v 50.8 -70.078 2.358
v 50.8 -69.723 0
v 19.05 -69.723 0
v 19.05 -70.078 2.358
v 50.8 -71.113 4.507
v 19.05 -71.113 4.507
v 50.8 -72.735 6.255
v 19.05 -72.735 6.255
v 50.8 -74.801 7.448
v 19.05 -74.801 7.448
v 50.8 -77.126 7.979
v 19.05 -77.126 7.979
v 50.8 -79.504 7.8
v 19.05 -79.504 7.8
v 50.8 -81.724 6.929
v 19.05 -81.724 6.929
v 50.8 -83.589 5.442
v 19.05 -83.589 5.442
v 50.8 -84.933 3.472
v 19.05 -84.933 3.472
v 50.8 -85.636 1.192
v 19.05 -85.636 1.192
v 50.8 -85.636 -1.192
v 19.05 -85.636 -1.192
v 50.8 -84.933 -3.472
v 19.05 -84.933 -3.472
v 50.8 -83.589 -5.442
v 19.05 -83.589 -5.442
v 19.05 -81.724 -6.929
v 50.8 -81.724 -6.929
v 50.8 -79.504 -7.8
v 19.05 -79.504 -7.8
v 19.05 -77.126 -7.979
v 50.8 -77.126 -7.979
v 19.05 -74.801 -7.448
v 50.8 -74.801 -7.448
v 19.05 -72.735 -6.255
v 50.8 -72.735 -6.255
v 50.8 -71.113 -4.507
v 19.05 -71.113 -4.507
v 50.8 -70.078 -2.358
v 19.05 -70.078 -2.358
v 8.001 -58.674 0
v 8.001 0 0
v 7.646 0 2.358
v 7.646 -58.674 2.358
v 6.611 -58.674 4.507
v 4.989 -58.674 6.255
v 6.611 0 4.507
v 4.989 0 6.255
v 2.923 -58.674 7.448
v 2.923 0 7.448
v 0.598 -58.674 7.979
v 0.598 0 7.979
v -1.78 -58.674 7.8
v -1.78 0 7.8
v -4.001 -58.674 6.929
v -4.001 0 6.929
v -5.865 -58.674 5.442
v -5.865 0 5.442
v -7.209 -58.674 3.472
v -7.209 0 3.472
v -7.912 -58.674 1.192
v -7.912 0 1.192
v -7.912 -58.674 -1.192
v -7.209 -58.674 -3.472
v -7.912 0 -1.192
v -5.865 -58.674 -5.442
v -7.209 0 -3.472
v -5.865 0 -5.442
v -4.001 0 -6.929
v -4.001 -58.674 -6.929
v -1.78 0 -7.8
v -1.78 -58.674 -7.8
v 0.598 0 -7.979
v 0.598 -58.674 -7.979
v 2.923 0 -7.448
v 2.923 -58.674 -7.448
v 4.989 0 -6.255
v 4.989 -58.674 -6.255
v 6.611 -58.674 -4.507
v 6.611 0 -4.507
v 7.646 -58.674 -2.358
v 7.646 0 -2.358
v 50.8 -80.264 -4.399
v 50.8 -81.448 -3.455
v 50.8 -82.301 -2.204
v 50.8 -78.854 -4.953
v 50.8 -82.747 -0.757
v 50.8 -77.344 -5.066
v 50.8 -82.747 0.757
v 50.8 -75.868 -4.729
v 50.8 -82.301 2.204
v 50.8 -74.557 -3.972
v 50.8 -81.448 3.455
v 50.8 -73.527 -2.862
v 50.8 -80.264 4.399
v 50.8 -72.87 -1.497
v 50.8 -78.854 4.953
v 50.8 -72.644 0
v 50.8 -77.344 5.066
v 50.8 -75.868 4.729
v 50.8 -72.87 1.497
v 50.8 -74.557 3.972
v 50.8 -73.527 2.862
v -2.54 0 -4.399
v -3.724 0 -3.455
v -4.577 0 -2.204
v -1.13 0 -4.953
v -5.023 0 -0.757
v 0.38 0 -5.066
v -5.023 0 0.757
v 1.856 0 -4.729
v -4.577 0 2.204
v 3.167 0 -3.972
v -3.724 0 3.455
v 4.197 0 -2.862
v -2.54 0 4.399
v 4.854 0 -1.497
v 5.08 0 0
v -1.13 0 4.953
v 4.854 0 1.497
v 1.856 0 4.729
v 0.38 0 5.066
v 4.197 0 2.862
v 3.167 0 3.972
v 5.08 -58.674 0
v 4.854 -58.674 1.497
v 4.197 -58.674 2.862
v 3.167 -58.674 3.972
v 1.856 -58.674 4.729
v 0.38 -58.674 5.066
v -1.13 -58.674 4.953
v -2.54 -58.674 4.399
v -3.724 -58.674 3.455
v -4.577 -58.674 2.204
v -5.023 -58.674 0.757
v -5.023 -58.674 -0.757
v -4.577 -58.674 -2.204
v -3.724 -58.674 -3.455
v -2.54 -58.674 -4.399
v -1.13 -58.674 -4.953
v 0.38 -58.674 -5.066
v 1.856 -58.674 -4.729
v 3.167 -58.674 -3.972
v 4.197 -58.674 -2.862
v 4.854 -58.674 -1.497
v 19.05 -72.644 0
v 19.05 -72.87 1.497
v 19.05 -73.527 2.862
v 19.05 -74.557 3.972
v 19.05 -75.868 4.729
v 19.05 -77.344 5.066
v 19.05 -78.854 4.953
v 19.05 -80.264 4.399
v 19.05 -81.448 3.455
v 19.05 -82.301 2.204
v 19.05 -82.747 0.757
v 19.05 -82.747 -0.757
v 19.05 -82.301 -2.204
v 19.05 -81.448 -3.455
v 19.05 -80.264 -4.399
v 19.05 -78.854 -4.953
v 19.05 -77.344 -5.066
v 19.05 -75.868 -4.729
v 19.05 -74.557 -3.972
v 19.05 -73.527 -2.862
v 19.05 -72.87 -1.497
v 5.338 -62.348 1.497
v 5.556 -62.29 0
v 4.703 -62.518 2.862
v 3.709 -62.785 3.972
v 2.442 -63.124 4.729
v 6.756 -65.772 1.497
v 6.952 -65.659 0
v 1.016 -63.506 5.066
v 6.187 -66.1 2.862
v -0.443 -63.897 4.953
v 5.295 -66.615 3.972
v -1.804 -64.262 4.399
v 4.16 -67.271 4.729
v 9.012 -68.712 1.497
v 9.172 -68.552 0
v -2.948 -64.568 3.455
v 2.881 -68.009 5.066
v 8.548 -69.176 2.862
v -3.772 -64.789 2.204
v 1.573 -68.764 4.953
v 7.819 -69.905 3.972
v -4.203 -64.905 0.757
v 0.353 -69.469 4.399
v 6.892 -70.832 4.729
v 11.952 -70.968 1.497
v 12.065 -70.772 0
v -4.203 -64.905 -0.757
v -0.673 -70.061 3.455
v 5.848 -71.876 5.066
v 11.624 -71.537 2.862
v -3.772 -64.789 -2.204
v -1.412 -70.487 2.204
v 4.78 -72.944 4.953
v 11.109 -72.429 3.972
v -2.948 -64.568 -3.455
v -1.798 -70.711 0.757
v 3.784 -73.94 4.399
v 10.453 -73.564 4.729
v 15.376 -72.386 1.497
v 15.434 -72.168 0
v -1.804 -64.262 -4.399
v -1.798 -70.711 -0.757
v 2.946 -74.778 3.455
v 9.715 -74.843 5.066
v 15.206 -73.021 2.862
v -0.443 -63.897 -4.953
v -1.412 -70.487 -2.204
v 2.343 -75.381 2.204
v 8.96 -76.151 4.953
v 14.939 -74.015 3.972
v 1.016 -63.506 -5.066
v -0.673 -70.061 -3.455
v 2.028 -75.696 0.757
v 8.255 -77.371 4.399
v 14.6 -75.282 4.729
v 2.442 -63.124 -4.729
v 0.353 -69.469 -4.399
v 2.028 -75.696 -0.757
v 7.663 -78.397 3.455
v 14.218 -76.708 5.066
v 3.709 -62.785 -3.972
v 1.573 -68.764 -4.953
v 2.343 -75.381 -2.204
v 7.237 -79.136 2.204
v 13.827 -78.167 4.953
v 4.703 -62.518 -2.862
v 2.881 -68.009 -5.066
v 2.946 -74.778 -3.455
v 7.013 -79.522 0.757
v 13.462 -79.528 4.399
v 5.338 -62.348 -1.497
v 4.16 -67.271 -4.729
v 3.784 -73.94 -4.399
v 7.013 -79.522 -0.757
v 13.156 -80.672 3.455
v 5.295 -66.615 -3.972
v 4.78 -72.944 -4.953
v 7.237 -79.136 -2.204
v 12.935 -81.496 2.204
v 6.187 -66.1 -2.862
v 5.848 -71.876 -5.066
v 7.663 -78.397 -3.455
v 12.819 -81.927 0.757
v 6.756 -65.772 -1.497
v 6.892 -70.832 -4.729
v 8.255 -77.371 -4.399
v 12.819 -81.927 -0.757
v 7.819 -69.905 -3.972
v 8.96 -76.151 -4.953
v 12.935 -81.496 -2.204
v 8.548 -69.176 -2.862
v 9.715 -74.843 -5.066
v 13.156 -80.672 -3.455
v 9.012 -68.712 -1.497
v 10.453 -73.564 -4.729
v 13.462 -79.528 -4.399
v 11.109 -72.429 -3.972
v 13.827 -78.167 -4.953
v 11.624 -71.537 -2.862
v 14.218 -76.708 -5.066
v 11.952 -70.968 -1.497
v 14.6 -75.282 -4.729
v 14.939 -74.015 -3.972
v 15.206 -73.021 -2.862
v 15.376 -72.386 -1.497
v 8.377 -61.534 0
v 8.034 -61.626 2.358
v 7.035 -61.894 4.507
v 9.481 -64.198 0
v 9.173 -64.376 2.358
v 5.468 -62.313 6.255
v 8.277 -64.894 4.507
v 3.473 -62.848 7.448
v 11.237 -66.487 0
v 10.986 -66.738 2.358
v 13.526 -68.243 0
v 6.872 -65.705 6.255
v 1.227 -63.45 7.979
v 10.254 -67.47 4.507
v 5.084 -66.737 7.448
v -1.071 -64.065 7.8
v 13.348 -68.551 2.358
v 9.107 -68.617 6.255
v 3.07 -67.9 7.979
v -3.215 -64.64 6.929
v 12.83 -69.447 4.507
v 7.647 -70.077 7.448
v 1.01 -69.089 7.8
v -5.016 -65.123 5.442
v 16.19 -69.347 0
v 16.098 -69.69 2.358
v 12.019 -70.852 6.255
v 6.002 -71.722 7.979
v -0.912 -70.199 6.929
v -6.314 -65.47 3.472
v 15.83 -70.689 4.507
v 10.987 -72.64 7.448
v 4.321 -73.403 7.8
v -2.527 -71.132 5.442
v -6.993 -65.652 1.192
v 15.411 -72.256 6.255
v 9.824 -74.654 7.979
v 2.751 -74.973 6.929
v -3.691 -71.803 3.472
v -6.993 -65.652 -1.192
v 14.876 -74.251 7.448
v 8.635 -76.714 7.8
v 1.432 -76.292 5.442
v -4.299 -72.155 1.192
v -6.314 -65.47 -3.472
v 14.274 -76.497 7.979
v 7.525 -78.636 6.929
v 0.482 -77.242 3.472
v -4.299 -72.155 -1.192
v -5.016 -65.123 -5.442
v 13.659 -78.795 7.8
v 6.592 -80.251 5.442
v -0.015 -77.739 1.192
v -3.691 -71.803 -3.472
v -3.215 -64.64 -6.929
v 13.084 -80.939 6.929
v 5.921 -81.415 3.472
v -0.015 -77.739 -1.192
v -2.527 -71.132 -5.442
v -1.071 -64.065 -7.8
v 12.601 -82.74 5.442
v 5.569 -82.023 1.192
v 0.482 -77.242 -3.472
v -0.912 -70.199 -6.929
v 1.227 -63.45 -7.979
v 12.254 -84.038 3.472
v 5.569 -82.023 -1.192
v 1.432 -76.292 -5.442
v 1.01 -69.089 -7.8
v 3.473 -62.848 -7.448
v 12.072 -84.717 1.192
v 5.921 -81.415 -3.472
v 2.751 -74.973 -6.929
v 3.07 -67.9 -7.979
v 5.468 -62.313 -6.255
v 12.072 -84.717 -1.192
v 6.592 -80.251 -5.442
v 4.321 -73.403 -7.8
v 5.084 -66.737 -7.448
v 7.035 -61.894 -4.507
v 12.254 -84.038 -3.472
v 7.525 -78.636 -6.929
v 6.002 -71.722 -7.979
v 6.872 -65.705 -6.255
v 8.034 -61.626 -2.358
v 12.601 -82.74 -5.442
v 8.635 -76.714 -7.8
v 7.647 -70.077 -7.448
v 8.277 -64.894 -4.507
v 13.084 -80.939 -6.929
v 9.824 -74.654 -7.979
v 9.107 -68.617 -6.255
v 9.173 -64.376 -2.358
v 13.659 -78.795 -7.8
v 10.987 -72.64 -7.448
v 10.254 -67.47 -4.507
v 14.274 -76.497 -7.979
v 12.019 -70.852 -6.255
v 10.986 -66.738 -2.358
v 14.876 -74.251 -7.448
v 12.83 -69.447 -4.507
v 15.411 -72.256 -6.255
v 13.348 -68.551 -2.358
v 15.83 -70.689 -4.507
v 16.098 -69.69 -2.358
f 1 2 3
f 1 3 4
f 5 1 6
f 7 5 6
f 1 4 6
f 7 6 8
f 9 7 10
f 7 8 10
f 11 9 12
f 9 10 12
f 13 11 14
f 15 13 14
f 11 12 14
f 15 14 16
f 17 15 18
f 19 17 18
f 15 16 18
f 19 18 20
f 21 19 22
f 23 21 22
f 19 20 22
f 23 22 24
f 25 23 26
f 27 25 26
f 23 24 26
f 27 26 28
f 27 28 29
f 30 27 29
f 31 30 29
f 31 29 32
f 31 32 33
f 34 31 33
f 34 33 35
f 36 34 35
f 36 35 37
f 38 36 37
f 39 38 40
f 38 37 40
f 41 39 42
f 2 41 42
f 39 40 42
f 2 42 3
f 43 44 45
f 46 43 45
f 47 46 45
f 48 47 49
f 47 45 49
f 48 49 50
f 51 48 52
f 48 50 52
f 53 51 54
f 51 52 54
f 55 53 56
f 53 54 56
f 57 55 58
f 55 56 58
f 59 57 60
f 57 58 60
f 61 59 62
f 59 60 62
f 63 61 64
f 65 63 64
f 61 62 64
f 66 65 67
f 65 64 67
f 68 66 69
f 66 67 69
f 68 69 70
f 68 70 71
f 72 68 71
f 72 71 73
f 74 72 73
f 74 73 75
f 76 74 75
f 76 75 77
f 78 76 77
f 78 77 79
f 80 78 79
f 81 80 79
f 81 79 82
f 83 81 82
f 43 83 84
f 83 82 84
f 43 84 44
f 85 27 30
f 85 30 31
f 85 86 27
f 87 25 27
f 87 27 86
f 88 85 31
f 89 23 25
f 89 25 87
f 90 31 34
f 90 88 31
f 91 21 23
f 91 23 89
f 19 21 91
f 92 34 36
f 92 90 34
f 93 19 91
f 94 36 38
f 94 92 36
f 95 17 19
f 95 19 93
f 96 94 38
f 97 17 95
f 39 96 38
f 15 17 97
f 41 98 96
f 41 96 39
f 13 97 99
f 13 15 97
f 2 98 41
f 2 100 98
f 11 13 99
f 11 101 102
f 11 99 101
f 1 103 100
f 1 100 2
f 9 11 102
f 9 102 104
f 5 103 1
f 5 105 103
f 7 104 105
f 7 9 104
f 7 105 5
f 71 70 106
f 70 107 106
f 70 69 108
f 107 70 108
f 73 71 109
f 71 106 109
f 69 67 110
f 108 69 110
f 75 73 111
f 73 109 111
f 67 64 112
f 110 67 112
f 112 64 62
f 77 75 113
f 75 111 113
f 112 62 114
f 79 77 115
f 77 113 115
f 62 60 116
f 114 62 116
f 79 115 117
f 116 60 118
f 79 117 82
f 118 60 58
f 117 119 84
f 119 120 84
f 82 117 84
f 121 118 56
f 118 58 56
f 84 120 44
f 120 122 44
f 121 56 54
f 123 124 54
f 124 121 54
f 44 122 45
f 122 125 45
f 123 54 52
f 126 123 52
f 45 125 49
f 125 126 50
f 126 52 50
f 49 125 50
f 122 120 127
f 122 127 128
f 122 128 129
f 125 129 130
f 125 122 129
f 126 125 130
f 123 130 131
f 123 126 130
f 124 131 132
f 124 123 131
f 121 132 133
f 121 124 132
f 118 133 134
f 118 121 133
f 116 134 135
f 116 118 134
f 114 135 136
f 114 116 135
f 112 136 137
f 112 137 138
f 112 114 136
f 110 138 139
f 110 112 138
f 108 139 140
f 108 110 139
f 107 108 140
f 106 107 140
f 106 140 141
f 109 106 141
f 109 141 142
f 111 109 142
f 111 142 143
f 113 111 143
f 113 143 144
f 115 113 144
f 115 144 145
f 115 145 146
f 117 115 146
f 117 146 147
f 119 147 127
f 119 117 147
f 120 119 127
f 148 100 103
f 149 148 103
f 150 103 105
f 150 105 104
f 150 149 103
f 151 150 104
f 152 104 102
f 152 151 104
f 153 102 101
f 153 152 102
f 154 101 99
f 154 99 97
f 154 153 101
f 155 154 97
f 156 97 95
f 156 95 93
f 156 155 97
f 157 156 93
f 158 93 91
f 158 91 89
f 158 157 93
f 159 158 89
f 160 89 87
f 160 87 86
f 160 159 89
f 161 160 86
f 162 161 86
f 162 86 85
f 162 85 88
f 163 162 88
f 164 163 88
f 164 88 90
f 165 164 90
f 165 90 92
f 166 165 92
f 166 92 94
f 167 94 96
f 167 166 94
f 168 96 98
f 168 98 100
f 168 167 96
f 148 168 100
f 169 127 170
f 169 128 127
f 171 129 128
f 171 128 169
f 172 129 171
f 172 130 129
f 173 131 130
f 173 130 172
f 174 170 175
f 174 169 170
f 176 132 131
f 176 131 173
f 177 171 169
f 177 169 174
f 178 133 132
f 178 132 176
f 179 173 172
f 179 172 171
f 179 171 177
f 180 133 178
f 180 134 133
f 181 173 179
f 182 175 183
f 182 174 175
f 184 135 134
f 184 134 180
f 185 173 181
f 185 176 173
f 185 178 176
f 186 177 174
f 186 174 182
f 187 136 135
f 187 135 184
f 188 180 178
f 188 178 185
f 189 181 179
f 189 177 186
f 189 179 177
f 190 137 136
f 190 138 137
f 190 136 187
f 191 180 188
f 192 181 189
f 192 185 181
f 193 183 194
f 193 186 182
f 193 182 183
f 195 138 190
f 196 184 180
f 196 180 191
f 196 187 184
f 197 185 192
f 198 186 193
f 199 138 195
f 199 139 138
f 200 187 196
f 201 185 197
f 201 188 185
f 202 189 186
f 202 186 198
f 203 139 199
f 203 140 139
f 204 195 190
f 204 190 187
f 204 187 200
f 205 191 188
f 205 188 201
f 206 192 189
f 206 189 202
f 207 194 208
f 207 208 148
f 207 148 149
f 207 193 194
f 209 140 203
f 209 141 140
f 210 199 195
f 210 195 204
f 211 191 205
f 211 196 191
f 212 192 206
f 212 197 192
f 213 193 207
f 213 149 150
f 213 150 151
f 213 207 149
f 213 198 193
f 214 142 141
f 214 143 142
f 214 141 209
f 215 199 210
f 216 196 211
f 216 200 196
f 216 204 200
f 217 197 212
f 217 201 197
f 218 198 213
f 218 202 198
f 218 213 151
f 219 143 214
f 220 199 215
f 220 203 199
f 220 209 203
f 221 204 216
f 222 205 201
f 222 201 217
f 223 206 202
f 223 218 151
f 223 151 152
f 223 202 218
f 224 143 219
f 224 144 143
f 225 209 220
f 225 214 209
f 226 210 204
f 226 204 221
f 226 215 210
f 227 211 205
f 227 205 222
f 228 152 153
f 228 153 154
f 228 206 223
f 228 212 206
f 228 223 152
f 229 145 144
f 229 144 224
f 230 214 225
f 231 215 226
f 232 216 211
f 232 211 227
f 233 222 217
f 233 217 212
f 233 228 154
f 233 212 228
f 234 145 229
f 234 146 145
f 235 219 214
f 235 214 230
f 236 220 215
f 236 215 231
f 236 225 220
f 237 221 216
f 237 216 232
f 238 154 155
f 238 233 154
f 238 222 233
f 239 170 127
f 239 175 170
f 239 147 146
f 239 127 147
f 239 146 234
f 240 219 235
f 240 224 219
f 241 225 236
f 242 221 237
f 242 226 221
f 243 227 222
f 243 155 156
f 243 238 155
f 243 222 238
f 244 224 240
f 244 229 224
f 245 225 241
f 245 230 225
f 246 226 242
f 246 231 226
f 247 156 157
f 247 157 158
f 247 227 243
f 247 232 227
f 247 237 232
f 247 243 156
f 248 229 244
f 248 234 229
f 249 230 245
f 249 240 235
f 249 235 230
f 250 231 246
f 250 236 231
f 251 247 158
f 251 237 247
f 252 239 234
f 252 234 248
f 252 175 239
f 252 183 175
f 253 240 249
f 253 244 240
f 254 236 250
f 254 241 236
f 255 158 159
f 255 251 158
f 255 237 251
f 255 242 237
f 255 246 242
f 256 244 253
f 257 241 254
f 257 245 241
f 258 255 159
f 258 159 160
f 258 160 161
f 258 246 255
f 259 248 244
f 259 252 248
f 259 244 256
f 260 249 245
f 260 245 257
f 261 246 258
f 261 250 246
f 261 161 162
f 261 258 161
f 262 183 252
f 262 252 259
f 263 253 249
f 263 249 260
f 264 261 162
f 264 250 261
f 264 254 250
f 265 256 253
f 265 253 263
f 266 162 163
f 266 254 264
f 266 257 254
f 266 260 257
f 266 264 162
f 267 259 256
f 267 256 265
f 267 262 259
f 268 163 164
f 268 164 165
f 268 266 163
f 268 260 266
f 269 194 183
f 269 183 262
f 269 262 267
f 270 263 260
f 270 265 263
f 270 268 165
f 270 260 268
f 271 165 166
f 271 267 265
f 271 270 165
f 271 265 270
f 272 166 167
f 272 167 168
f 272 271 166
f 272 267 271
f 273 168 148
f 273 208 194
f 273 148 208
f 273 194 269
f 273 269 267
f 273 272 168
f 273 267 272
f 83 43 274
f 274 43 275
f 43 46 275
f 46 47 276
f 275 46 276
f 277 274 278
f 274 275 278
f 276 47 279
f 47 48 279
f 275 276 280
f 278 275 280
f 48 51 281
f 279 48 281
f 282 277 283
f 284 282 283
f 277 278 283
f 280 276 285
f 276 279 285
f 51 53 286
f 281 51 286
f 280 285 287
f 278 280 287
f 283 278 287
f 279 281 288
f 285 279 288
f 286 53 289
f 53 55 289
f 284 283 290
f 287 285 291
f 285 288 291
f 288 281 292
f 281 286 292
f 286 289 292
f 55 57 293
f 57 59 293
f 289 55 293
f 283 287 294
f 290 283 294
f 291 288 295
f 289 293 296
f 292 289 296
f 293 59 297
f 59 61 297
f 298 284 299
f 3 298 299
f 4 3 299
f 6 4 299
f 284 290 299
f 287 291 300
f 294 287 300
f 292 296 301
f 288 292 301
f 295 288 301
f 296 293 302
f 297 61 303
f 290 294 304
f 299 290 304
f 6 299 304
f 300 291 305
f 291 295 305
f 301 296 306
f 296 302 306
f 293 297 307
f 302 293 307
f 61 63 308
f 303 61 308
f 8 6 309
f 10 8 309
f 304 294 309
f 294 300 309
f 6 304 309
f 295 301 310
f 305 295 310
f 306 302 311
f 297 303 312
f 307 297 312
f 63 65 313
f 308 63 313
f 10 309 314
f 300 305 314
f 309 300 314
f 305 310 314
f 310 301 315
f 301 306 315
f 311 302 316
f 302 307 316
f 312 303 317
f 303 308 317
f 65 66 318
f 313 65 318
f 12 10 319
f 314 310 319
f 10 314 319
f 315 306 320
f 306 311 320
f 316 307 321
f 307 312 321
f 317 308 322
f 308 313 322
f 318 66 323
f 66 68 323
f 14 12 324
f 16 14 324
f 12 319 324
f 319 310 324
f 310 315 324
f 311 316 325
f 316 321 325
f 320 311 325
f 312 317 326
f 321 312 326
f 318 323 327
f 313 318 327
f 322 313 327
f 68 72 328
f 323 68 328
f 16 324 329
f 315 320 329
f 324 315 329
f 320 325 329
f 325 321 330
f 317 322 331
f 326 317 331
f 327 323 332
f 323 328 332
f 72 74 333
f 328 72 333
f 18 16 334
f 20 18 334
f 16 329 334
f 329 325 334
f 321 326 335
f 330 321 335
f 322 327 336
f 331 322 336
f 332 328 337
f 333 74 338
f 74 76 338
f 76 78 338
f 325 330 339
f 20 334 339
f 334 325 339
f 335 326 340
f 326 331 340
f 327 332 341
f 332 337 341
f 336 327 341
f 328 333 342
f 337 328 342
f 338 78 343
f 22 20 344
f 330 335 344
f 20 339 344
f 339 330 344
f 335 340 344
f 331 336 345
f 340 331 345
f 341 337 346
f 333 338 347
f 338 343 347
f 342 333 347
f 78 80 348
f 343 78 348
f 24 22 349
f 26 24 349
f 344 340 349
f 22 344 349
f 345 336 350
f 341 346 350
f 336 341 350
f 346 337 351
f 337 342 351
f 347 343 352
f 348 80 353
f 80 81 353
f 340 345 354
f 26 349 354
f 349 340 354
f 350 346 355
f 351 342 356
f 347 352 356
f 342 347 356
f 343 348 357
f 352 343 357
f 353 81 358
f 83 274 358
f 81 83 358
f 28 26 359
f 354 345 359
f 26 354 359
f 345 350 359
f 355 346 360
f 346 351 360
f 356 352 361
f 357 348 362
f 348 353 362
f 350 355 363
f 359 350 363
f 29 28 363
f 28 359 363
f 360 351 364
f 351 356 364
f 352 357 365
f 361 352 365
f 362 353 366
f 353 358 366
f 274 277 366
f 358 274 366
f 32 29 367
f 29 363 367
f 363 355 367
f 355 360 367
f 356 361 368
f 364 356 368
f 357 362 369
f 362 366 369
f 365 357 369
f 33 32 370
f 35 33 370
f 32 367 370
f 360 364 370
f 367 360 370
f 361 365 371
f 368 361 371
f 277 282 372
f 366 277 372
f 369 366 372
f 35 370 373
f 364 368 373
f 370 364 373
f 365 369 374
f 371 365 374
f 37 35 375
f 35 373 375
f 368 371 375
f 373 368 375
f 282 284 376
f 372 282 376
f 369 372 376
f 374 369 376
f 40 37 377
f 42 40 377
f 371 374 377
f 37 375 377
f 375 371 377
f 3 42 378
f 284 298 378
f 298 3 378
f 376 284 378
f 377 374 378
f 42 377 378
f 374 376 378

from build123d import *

# Parameters (mm, degrees)
F0_R     = 8.001
F0_R_2   = 5.08
F1_DEPTH = 58.674
F2_R     = 8.001
F2_R_2   = 5.08
F3_ANGLE = -90
F4_R     = 8.001
F4_R_2   = 5.08
F5_DEPTH = 31.75


with BuildPart() as f1:
    # F0 (on Front) → F1 (new body)
    with BuildSketch(Plane.XZ):
        Circle(F0_R)
        Circle(F0_R_2, mode=Mode.SUBTRACT)
    extrude(amount=F1_DEPTH)

    # F2 (on face) → F3 (revolve)
    with BuildSketch(Plane.XZ.offset(58.674)):
        Circle(F2_R)
        Circle(F2_R_2, mode=Mode.SUBTRACT)
    revolve(axis=Axis((19.05, -58.674, -0.586418), (0, 0, -1)), revolution_arc=F3_ANGLE)

    # F4 (on face) → F5 (join)
    with BuildSketch(Plane.YZ.offset(19.05)):
        with Locations((-77.724, 0)):
            Circle(F4_R)
        with Locations((-77.724, 0)):
            Circle(F4_R_2, mode=Mode.SUBTRACT)
    extrude(amount=F5_DEPTH)


solid = f1.part
